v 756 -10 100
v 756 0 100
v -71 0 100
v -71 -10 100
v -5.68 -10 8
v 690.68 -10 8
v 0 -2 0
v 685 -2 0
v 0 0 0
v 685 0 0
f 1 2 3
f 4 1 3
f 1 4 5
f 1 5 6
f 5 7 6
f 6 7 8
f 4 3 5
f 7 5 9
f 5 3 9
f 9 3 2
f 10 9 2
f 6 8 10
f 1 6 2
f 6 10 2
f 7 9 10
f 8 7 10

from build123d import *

# Parameters (mm, degrees)
F1_DEPTH = 10
F3_DEPTH = 674.322728
F6_DEPTH = 674.322728
F7_SIZE2 = 8
F7_SIZE  = 8


with BuildPart() as f1:
    # F0 (on Front) → F1 (new body)
    with BuildSketch(Plane.XZ):
        Polygon((-71, 100), (0, 0), (685, 0), (756, 100), align=None)
    extrude(amount=F1_DEPTH)

    # F2 (on face) → F3 (cut, through all)
    with BuildSketch(Plane(origin=(455.421847, 0, -323.349511), x_dir=(0, 1, 0), z_dir=(0.815383, 0, -0.578922))):
        Polygon((-10, 519.203269), (0, 519.203269), (0, 523.92737), (-15.178904, 523.92737), (-15.178904, 510.439725), (-10, 513.429767), align=None)
    extrude(amount=-F3_DEPTH, mode=Mode.SUBTRACT)

    # F5 (on face) → F6 (cut, through all)
    with BuildSketch(Plane(origin=(455.421847, 0, -323.349511), x_dir=(0, 1, 0), z_dir=(0.815383, 0, -0.578922))):
        Polygon((-196.915056, 209.646459), (-210.872175, 195.689339), (-196.915056, 195.689339), align=None)
    extrude(amount=-F6_DEPTH, mode=Mode.SUBTRACT)

    # F7
    f7_edges = [f1.edges().sort_by_distance(p)[0] for p in [
        (342.5, -10, 0),
    ]]
    chamfer(f7_edges, length=F7_SIZE, length2=F7_SIZE2)


solid = f1.part
